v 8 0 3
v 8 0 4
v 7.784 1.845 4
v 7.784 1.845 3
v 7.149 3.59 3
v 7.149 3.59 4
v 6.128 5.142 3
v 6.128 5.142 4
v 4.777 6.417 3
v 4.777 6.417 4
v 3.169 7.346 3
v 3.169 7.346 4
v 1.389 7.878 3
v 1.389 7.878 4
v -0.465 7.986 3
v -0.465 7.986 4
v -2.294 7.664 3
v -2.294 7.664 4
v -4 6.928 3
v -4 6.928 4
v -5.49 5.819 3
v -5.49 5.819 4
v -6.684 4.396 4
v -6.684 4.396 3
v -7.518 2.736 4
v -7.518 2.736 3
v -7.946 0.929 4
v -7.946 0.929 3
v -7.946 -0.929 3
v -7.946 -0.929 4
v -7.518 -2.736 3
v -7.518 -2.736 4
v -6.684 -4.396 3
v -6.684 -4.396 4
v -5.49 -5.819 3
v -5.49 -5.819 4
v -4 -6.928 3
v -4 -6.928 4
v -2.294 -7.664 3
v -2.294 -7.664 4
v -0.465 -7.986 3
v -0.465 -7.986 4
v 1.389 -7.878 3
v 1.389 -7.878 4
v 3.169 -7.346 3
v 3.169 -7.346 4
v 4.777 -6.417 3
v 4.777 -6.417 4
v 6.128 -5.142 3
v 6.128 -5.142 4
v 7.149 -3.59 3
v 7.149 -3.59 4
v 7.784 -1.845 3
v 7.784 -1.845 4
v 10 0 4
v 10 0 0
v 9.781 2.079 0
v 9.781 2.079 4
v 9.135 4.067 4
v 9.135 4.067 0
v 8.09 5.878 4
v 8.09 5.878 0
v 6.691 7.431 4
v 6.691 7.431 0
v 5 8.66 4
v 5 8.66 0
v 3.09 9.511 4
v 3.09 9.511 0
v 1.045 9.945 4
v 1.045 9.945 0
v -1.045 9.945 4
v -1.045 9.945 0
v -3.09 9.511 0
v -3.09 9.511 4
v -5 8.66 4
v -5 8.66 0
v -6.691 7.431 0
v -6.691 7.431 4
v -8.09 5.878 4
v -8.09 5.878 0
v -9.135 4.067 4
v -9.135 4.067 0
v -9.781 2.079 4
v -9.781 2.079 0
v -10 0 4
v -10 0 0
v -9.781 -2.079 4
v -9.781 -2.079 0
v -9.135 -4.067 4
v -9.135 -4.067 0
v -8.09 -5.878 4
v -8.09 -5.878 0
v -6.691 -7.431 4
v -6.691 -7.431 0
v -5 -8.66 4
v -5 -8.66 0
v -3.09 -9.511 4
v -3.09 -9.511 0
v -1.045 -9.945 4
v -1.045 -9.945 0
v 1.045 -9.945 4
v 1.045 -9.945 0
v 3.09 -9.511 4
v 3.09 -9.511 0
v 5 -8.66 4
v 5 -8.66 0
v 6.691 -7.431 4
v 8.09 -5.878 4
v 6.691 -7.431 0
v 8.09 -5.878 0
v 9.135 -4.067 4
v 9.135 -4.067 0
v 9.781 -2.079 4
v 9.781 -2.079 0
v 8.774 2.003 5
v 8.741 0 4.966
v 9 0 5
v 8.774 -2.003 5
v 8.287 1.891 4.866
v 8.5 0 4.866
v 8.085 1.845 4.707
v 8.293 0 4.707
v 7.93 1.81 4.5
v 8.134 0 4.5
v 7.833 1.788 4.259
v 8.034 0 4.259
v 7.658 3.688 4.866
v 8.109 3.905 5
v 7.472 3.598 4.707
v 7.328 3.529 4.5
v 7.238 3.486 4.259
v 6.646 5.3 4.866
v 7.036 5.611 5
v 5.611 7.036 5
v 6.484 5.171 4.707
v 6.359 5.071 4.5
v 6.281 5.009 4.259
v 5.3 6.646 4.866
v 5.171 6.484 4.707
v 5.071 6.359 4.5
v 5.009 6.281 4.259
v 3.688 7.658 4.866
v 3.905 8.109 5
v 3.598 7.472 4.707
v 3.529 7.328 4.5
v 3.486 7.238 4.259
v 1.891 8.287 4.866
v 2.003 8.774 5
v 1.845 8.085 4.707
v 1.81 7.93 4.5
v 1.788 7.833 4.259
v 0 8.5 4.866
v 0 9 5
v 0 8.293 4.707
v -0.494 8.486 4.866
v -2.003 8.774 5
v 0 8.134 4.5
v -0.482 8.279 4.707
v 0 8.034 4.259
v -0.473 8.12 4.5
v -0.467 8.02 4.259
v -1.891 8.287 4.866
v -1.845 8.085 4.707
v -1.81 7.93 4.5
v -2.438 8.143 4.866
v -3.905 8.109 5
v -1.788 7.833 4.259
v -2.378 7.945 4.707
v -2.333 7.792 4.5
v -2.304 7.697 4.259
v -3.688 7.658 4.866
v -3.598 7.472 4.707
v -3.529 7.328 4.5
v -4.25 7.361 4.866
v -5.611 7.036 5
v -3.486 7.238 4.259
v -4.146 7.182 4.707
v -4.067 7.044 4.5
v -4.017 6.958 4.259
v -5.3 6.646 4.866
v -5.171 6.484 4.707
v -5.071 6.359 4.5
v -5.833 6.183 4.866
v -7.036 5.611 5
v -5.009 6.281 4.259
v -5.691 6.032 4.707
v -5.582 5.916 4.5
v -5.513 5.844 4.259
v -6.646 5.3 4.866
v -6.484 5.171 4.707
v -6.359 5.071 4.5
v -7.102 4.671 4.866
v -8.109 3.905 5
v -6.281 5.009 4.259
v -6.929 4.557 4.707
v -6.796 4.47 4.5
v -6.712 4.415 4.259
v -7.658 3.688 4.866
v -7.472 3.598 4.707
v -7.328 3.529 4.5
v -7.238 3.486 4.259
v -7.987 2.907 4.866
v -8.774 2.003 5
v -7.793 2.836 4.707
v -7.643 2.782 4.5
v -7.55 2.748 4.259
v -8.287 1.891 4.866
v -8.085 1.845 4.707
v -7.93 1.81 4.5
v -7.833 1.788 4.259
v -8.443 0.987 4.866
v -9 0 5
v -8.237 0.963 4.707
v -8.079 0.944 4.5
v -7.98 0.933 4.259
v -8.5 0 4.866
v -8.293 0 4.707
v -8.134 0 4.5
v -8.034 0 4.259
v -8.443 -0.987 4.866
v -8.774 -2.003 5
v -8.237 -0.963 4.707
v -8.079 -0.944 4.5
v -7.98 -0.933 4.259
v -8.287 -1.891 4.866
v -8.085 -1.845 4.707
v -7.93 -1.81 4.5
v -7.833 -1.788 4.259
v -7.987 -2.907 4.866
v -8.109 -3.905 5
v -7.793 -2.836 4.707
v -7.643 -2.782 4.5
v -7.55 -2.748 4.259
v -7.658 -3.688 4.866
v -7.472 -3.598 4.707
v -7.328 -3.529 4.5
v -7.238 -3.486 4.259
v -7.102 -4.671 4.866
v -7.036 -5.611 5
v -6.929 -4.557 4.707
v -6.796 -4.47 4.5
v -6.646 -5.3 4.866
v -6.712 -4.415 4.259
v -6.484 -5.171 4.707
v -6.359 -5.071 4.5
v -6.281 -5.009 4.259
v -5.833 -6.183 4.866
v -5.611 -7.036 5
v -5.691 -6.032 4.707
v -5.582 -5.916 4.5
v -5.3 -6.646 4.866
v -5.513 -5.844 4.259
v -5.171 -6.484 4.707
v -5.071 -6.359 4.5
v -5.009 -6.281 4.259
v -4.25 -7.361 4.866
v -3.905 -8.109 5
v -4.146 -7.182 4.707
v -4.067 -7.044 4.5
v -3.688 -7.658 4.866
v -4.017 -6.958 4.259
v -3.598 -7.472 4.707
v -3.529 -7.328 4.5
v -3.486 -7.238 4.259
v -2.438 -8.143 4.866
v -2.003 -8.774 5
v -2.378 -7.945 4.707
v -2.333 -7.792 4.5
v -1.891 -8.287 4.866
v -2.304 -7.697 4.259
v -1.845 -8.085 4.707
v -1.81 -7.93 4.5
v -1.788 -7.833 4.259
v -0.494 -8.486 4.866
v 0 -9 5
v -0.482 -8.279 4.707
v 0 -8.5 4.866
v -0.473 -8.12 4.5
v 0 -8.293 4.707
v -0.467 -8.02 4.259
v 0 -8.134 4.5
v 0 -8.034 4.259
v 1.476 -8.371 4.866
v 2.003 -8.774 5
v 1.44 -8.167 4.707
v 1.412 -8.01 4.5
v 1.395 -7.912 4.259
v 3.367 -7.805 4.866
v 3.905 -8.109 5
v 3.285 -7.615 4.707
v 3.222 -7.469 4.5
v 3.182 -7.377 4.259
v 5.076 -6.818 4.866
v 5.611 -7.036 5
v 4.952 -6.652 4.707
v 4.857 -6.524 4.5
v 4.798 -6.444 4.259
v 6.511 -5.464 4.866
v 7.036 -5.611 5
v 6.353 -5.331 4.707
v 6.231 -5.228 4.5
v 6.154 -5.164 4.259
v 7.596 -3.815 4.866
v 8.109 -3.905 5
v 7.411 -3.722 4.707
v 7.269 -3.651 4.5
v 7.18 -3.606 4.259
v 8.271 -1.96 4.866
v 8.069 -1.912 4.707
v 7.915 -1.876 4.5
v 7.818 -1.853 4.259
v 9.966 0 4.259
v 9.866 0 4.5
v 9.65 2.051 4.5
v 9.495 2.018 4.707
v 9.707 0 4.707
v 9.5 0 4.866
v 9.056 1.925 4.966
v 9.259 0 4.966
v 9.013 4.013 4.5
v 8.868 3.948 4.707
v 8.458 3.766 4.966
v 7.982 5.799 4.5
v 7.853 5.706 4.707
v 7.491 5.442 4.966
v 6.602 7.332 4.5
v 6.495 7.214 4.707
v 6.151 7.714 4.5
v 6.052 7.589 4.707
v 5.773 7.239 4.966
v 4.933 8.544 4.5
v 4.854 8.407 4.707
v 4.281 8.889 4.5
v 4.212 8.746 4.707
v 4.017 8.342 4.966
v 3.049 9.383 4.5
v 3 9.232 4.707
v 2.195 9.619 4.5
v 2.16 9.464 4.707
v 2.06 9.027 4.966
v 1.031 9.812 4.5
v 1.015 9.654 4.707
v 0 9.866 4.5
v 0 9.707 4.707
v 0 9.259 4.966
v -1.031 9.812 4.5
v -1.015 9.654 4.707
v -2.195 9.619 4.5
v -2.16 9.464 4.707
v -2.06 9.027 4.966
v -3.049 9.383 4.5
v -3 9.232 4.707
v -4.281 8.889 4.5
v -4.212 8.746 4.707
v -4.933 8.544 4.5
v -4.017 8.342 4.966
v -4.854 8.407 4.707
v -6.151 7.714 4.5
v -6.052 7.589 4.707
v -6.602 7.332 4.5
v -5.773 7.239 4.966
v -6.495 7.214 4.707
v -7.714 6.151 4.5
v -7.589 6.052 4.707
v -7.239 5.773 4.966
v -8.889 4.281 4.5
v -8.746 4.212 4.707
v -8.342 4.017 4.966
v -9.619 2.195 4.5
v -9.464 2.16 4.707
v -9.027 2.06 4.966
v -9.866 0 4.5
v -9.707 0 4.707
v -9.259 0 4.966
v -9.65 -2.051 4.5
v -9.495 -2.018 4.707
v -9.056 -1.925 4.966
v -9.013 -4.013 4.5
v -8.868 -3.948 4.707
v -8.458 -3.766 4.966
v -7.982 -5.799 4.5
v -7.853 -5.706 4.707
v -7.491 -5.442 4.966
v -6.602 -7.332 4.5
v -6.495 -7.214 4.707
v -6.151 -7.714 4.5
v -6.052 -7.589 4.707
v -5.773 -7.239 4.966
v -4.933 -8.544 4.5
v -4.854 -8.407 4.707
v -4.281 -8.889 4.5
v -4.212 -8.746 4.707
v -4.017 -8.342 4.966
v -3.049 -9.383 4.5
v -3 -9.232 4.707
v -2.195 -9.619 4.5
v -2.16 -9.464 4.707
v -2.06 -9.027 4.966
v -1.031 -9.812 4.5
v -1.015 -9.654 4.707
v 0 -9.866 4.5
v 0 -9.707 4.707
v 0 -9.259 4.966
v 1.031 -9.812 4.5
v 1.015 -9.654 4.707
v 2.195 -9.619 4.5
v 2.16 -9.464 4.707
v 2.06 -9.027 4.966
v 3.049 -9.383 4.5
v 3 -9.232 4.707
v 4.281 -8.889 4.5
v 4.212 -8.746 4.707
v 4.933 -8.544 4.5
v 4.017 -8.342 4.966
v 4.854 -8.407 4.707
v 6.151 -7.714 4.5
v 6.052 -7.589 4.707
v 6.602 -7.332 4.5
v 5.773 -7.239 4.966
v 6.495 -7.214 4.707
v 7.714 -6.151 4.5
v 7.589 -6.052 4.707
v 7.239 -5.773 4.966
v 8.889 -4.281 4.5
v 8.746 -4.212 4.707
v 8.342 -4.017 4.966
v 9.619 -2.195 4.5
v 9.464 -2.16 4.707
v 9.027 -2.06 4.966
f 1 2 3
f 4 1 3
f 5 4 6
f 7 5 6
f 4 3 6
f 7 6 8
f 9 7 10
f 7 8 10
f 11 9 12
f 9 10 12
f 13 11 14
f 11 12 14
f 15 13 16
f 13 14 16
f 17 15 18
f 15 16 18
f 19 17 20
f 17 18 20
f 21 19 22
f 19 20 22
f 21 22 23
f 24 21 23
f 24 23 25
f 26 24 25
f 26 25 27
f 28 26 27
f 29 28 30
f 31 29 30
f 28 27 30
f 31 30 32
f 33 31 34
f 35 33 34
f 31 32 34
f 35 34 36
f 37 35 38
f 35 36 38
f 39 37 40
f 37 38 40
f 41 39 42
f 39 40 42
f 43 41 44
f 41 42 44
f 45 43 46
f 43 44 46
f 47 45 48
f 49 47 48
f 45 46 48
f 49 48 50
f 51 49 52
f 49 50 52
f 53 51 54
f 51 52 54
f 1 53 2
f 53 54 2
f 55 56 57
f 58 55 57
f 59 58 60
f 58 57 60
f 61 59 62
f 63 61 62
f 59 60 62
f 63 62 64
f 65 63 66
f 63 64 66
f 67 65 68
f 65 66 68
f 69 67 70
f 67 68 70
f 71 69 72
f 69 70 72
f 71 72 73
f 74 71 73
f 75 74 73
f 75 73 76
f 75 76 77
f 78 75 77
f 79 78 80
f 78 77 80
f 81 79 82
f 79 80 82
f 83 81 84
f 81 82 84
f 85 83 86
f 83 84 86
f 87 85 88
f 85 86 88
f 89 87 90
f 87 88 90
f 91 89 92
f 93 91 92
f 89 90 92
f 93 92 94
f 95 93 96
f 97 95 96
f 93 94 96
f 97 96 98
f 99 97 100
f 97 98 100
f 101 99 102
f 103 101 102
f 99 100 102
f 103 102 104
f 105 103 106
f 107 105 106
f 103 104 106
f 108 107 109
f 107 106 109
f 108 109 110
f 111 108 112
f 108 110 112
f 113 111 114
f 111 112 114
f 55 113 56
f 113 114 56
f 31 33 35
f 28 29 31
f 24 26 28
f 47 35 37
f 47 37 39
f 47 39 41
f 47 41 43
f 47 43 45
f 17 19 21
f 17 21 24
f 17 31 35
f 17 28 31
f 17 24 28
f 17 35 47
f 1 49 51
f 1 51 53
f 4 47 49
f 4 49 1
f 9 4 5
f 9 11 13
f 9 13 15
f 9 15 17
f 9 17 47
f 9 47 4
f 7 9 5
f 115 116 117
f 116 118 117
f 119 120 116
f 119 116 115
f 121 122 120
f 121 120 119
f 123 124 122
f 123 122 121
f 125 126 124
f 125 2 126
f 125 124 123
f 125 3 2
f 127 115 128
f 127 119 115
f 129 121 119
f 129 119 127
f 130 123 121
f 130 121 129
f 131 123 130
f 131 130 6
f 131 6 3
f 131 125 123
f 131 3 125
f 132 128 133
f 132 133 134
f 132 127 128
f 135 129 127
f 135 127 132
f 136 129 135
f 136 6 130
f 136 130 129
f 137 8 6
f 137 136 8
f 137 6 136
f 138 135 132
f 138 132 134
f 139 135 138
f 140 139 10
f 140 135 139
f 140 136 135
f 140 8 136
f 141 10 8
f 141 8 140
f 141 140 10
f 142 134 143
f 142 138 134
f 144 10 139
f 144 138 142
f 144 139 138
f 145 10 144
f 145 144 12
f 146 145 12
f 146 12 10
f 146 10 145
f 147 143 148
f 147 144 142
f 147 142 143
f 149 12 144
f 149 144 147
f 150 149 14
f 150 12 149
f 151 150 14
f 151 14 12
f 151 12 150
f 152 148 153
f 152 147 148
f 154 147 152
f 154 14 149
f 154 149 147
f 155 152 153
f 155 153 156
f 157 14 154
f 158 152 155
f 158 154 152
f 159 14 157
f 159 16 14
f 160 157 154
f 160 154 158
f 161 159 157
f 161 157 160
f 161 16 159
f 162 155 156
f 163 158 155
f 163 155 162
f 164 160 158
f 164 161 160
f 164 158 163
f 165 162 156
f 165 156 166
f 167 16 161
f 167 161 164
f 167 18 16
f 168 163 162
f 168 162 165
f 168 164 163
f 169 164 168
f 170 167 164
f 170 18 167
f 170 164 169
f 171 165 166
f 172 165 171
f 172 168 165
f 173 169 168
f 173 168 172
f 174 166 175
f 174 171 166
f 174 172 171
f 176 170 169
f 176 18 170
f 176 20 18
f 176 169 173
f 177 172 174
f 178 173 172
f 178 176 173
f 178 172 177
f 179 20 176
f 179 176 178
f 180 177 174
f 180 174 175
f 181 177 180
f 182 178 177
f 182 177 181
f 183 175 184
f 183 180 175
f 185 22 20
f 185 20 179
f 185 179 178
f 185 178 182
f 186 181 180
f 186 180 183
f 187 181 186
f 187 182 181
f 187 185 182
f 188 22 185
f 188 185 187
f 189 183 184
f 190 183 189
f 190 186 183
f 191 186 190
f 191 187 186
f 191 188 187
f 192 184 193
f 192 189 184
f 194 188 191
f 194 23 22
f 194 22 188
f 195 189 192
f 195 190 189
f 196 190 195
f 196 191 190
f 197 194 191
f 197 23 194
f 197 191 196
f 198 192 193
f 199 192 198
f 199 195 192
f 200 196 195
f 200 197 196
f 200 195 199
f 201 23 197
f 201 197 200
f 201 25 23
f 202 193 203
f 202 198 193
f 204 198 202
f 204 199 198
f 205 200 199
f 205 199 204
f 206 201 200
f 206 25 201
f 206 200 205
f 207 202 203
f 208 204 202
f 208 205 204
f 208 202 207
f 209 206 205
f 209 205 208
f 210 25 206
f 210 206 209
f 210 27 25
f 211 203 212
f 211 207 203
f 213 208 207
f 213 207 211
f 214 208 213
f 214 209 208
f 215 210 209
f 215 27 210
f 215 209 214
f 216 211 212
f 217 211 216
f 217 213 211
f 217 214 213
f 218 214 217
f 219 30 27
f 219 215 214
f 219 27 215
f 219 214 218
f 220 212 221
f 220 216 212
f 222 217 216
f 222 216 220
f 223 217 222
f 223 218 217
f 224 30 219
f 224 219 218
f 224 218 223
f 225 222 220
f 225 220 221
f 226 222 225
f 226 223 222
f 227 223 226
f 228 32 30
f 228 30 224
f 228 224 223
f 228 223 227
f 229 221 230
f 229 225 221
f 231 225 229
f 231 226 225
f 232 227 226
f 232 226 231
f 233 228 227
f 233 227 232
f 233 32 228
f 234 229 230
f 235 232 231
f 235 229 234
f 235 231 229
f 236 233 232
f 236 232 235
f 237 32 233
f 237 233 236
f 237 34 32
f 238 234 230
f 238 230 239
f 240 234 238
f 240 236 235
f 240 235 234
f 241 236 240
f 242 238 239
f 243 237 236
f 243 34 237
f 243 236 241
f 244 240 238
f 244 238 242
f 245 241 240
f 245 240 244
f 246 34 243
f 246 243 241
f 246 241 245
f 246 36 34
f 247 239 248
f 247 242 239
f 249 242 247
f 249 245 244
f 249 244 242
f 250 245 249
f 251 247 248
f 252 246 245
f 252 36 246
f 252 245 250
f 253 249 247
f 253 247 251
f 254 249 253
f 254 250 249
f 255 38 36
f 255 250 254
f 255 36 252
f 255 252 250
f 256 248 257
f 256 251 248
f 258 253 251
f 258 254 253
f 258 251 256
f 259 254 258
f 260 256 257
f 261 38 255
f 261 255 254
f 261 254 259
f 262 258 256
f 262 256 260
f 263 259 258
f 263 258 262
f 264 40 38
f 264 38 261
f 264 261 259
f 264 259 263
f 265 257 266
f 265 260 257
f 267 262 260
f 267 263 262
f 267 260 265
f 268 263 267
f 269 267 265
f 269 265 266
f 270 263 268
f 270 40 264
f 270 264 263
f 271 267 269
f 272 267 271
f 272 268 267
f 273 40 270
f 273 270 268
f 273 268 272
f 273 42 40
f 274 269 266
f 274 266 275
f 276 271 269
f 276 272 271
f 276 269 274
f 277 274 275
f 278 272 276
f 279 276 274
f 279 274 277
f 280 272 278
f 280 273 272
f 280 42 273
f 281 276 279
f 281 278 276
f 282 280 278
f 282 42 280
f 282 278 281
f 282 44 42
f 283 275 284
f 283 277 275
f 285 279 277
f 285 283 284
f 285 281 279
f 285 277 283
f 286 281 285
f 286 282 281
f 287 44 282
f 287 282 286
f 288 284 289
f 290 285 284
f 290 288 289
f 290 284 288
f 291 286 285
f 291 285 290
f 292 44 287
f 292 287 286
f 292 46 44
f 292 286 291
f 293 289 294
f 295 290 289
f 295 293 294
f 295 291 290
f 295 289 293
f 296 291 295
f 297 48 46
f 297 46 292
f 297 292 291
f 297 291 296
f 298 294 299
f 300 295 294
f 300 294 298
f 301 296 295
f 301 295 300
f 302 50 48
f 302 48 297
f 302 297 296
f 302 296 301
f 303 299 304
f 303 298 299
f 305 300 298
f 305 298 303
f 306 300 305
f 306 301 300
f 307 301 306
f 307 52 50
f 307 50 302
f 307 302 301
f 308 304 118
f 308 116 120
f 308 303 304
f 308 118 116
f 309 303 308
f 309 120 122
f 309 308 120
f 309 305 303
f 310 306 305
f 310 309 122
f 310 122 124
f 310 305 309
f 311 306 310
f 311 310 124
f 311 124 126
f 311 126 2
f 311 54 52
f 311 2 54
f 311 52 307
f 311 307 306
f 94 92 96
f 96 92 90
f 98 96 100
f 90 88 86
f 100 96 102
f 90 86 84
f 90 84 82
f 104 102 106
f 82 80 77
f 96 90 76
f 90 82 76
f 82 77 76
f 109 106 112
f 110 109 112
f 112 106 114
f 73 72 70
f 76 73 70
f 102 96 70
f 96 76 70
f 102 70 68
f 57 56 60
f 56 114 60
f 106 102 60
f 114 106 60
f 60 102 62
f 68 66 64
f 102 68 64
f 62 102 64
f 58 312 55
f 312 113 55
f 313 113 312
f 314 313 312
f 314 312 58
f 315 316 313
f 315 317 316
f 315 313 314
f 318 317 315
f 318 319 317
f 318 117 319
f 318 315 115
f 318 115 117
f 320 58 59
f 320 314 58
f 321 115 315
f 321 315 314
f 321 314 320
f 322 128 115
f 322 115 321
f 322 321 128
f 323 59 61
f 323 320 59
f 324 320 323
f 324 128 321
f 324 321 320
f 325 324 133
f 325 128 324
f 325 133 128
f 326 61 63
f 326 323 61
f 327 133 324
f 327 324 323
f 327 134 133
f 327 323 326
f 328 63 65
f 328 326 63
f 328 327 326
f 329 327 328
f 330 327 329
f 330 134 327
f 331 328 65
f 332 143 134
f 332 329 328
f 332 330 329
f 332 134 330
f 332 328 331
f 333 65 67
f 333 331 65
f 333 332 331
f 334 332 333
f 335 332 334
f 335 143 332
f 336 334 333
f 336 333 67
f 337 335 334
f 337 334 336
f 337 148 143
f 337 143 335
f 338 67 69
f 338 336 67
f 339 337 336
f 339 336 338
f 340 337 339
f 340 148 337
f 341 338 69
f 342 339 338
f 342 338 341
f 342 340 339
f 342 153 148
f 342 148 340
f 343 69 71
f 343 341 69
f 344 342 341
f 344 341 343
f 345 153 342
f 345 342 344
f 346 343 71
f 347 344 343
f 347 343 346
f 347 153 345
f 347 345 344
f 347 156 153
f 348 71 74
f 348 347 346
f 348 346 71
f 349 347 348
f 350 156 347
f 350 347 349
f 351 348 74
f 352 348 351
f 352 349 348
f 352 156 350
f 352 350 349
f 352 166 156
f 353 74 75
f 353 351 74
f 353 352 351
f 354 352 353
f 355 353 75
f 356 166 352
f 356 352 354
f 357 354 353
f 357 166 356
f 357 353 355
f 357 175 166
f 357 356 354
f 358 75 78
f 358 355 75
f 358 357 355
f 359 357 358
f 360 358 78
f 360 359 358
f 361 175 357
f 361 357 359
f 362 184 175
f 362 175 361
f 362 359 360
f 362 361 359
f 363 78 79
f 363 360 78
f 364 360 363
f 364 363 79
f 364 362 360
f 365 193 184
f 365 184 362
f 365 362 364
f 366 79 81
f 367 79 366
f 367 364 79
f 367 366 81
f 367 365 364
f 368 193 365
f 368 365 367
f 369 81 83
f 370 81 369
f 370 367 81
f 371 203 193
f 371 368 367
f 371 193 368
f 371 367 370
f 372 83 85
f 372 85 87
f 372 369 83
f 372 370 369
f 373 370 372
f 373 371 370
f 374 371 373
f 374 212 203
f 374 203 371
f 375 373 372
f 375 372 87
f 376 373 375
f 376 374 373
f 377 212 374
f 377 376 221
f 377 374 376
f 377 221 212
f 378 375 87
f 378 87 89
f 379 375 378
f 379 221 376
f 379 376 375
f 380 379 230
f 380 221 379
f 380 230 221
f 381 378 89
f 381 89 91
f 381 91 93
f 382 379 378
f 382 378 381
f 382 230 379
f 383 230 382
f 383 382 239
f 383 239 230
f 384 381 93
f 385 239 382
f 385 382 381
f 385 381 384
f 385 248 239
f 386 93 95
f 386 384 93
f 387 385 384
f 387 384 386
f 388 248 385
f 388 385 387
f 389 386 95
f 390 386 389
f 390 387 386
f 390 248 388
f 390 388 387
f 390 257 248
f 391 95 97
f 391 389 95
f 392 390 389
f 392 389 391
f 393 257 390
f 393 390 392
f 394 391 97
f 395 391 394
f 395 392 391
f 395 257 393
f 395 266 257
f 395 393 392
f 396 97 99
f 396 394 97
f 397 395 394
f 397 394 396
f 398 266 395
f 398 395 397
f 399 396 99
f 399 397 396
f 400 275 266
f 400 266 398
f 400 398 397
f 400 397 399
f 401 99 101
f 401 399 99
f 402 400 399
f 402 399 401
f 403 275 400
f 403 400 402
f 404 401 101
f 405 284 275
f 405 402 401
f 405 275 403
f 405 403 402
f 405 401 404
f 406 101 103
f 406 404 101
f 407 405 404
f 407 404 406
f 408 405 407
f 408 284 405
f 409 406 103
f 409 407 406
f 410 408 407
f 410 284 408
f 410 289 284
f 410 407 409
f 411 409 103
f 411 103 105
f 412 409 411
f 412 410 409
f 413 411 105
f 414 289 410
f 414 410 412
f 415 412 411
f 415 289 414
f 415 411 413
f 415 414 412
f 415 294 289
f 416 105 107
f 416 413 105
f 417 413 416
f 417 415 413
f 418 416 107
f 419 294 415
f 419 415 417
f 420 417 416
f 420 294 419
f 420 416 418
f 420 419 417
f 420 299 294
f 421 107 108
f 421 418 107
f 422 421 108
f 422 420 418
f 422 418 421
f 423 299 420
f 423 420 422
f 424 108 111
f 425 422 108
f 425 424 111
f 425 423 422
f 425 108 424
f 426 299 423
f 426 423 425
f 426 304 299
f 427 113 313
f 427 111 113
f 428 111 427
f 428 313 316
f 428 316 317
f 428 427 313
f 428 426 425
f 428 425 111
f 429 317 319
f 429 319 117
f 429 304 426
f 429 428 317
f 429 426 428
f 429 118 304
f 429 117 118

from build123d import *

# Parameters (mm, degrees)
F0_R     = 10
F1_DEPTH = 5
F2_R     = 8
F3_DEPTH = 2
F4_R     = 0.99999


# Not quite as in the source:
# - a fillet or chamfer is up to 0.001 mm smaller than in the source, because OpenCascade refuses the exact size


with BuildPart() as f1:
    # F0 (on Top) → F1 (new body)
    with BuildSketch(Plane.XY):
        Circle(F0_R)
    extrude(amount=F1_DEPTH)

    # F2 (on face) → F3 (cut)
    with BuildSketch(Plane.XY.offset(5)):
        Circle(F2_R)
    extrude(amount=-F3_DEPTH, mode=Mode.SUBTRACT)

    # F4 (radius 1 in the source; OpenCascade refuses exactly that, so slightly less here)
    f4_edges = [f1.edges().sort_by_distance(p)[0] for p in [
        (-10, 0, 5),
        (-8, 0, 5),
    ]]
    fillet(f4_edges, radius=F4_R)


solid = f1.part
